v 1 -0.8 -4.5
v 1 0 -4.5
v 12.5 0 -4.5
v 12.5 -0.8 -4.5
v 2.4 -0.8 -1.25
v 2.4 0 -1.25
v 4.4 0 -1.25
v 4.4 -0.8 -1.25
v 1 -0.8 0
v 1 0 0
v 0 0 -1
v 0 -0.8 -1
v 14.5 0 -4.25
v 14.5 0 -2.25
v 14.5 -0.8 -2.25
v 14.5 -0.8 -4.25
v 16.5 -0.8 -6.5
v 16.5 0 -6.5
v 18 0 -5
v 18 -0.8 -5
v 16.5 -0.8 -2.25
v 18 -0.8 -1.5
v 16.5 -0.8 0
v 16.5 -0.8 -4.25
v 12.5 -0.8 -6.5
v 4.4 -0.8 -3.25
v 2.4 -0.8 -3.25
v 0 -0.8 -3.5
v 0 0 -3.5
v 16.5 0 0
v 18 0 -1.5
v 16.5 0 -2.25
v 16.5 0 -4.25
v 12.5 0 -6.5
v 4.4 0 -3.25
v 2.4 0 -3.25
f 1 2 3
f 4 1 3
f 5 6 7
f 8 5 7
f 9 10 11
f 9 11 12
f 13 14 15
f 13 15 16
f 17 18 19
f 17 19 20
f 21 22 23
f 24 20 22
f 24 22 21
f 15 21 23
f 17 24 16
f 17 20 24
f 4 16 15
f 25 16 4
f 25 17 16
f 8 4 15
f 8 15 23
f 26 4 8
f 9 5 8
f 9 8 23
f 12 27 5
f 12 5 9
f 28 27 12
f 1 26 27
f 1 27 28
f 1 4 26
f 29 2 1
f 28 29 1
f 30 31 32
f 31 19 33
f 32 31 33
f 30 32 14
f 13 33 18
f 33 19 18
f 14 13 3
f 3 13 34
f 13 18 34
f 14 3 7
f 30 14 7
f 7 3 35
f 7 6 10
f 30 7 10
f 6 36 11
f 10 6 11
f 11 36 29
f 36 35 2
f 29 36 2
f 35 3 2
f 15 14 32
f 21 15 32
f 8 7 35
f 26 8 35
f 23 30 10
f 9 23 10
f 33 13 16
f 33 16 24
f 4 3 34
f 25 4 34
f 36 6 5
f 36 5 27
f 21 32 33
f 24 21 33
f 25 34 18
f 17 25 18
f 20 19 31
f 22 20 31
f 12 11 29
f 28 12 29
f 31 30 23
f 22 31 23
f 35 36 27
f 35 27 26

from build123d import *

# Parameters (mm, degrees)
SKETCH_1_W             = 2
SKETCH_1_H             = 2
SM_BASE_FLANGE_1_DEPTH = 0.8
CHAMFER_1_SIZE         = 1
CHAMFER_2_SIZE         = 1.5


# Sheet-metal steps are written as plain solids
with BuildPart() as part:
    # Sketch 1 → Базовая кромка1 (new body)
    with BuildSketch(Plane(origin=(0, 0, 0), x_dir=(1, 0, 0), z_dir=(0, 1, 0))):
        Polygon((0, 0), (0, 4.5), (12.5, 4.5), (12.5, 6.5), (18, 6.5), (18, 0), align=None)
        with Locations((3.4, 2.25)):
            Rectangle(SKETCH_1_W, SKETCH_1_H, mode=Mode.SUBTRACT)
        with Locations((15.5, 3.25)):
            Rectangle(SKETCH_1_W, SKETCH_1_H, mode=Mode.SUBTRACT)
    extrude(amount=-SM_BASE_FLANGE_1_DEPTH)

    # Фаска1
    chamfer_1_edges = [part.edges().sort_by_distance(p)[0] for p in [
        (0, -0.4, 0),
        (0, -0.4, -4.5),
    ]]
    chamfer(chamfer_1_edges, length=CHAMFER_1_SIZE)

    # Фаска2
    chamfer_2_edges = [part.edges().sort_by_distance(p)[0] for p in [
        (18, -0.4, -6.5),
        (18, -0.4, 0),
    ]]
    chamfer(chamfer_2_edges, length=CHAMFER_2_SIZE)


solid = part.part
